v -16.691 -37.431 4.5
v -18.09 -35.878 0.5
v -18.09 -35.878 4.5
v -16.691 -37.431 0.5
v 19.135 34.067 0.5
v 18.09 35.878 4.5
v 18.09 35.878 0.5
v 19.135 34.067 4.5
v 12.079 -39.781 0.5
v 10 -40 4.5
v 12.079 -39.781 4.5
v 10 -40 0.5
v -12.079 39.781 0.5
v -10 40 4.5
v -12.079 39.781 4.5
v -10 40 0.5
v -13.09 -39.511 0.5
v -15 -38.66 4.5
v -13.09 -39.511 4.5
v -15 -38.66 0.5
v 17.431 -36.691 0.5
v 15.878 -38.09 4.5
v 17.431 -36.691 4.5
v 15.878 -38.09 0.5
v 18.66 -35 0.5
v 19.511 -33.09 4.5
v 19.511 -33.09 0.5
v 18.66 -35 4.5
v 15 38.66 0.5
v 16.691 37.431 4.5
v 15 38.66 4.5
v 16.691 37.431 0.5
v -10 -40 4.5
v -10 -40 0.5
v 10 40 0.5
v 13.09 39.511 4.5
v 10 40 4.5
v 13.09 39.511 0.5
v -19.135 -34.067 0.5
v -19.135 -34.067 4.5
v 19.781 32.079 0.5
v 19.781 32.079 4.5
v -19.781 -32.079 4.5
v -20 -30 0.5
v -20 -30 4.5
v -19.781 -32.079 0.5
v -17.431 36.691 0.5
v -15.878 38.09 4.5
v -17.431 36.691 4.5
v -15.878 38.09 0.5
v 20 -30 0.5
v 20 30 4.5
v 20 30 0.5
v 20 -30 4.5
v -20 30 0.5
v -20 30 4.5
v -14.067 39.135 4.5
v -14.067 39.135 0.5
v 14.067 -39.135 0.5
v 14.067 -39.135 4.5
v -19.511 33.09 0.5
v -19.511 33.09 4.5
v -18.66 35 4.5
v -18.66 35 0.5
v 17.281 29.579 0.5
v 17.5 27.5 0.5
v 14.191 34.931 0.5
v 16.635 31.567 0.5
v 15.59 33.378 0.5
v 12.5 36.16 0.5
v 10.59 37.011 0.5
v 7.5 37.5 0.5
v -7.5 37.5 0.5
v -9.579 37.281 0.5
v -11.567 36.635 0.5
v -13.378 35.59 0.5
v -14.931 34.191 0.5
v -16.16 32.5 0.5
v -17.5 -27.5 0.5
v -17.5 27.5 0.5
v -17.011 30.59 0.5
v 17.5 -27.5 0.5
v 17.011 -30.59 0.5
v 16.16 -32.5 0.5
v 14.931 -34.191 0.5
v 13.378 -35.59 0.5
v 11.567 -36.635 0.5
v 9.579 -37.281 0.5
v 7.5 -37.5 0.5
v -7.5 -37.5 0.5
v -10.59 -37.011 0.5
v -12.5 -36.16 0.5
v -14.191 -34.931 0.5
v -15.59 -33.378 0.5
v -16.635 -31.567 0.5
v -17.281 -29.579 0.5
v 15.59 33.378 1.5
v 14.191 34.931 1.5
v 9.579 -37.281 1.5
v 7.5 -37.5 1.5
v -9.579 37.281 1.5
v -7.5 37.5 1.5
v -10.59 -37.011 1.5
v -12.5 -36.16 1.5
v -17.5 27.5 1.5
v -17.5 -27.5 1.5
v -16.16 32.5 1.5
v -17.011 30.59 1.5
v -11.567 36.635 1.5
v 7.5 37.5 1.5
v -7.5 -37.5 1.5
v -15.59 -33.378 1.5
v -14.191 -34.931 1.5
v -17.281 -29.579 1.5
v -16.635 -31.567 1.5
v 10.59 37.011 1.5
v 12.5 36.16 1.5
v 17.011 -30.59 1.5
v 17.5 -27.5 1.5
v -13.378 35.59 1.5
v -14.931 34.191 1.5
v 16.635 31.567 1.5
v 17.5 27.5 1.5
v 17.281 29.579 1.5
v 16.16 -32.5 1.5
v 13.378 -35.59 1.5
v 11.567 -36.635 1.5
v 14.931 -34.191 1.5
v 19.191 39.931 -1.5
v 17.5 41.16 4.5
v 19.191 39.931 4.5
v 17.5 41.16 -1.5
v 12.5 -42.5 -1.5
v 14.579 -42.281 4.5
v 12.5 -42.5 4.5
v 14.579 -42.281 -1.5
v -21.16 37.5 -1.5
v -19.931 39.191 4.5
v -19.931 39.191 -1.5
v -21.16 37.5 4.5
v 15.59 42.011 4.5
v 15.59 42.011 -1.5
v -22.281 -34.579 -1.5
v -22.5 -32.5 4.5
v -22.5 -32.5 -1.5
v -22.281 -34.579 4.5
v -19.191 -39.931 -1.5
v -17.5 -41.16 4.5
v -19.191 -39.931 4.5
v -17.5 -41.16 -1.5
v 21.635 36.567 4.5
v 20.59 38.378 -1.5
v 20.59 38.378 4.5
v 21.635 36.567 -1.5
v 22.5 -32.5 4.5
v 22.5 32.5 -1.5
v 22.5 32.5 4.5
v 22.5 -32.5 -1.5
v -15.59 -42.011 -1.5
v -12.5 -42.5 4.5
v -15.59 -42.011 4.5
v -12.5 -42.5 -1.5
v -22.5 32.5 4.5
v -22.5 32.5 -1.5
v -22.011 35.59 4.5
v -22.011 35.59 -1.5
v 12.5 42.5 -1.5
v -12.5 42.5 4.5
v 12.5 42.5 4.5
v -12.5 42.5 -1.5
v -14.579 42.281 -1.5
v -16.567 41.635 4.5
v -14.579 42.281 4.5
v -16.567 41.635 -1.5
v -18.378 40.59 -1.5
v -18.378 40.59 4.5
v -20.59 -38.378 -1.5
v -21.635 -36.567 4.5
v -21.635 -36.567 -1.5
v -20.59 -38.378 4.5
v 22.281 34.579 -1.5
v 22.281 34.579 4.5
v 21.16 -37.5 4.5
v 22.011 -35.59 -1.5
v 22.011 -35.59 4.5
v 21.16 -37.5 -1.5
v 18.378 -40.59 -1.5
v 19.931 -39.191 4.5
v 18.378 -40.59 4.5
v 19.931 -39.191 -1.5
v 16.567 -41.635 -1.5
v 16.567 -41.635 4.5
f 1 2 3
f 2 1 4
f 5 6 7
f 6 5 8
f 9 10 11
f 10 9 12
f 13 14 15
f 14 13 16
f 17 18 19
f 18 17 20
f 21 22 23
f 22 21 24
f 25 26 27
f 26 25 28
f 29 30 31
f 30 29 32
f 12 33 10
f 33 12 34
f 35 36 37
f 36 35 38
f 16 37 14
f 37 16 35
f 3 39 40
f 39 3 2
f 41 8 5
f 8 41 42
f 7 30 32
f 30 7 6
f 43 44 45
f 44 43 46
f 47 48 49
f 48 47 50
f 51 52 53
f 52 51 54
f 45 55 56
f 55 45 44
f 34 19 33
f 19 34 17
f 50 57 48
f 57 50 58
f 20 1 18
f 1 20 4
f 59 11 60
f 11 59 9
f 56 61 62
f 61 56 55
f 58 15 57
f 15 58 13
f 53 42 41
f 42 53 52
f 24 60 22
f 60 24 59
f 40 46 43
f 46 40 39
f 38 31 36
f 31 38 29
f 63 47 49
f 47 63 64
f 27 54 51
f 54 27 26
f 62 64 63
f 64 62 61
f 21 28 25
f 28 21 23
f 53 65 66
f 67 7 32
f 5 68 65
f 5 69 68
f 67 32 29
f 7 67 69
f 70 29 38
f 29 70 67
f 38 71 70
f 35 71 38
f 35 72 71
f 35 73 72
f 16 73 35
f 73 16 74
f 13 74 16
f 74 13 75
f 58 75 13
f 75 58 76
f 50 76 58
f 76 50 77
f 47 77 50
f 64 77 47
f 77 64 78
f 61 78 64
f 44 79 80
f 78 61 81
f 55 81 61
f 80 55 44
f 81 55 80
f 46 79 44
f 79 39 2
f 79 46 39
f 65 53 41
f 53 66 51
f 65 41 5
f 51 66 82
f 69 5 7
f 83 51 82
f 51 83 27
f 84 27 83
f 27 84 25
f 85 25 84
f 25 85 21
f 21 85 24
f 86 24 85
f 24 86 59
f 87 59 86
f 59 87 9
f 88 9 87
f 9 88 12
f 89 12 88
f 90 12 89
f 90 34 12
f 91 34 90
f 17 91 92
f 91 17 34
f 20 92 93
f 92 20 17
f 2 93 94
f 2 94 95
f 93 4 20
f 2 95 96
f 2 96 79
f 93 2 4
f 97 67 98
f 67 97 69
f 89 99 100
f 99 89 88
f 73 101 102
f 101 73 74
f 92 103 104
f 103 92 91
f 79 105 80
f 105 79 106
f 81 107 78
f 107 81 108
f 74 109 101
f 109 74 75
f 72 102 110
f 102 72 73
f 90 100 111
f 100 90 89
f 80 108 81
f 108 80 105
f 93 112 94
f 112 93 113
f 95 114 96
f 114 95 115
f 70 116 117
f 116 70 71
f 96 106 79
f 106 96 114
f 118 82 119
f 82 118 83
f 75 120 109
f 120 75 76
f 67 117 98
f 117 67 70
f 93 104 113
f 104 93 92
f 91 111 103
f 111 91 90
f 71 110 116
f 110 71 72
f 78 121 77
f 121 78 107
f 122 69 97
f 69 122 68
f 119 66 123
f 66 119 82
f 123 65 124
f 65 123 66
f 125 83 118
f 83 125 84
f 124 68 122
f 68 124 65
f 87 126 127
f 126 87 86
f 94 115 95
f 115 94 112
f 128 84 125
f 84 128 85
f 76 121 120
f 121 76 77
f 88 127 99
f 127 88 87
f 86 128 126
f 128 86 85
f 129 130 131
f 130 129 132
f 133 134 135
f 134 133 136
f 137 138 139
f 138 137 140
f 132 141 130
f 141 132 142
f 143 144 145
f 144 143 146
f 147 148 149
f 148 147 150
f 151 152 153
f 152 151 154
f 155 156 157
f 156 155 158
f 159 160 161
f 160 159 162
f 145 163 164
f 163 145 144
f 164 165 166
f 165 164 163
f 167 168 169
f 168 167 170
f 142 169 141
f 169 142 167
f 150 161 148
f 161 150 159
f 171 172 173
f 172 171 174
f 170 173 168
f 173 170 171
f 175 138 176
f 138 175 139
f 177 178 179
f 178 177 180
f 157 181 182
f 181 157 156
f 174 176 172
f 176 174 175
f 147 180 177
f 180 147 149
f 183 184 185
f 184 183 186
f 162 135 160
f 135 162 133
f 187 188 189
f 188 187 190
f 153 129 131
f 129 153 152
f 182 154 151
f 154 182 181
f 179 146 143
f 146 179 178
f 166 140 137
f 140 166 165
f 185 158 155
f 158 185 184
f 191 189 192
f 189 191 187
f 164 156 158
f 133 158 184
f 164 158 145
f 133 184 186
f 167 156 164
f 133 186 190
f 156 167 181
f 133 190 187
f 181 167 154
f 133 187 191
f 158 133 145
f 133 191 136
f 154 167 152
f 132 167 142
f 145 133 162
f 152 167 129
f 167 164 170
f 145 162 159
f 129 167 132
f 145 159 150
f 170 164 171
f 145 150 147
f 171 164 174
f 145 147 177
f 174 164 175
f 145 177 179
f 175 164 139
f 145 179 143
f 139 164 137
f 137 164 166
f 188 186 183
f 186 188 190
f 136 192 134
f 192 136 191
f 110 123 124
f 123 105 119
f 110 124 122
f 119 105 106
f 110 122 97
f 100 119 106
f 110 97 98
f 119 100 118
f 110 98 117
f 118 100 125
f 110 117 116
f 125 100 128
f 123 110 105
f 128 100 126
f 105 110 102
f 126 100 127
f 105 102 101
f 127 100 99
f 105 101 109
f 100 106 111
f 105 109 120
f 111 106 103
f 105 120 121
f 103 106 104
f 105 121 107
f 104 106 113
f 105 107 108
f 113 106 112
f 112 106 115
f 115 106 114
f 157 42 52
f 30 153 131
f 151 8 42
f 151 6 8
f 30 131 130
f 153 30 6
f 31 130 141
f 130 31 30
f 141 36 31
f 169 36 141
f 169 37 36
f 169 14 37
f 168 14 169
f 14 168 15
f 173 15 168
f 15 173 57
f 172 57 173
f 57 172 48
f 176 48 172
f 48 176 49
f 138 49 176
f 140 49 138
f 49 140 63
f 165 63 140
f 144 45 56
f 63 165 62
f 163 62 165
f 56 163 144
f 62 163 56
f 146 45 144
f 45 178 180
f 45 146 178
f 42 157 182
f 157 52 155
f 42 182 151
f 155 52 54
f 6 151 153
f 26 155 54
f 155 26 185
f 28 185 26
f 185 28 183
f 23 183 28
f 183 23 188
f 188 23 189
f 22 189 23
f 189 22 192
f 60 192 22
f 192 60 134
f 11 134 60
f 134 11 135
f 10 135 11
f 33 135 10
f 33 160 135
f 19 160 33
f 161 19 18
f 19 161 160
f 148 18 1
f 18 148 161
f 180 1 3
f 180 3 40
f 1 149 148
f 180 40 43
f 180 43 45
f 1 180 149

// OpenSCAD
/*
 * Test for a stamp mold
 */
echo(version=version());

// Base plate
// ----------
plateWidth = 45;    // 50
plateLength = 85;   // 50
plateThickNess = 3;
cornerRadius = 10;

logo = "./images/corine.02.small.png"; 
imgRatio = 0.9;
logox = 500 * imgRatio; 
logoy = 450 * imgRatio; 

module roundedRect(size, radius) {  
	linear_extrude(height=size.z, center=true) {
		offset(radius) offset(-radius) {
			square([size.x, size.y], center = true);
		}
	}
}

difference() {  
	union() {
		difference() {
			roundedRect([plateWidth, plateLength, plateThickNess], cornerRadius);
			translate([0, 0, 2]) {
				scale([.9 * plateWidth / logox, .9 * plateWidth / logoy, .02]) {
					color("white") {
						rotate([0, 0, -90]) {
							surface(file=logo, invert=true, center=true);
						}
					}
				}
        // the groove around the picture
        difference() {
          roundedRect([plateWidth -  5, plateLength -  5, plateThickNess], cornerRadius);
          roundedRect([plateWidth - 10, plateLength - 10, plateThickNess * 1.1], cornerRadius);
        }
			}
		}
		// The frame
		translate([0, 0, (plateThickNess / 1)]) {
			difference() {
				roundedRect([plateWidth, plateLength, plateThickNess], cornerRadius);
				roundedRect([plateWidth - 5, plateLength - 5, plateThickNess * 1.1], cornerRadius);
			}
		}
	}
}
